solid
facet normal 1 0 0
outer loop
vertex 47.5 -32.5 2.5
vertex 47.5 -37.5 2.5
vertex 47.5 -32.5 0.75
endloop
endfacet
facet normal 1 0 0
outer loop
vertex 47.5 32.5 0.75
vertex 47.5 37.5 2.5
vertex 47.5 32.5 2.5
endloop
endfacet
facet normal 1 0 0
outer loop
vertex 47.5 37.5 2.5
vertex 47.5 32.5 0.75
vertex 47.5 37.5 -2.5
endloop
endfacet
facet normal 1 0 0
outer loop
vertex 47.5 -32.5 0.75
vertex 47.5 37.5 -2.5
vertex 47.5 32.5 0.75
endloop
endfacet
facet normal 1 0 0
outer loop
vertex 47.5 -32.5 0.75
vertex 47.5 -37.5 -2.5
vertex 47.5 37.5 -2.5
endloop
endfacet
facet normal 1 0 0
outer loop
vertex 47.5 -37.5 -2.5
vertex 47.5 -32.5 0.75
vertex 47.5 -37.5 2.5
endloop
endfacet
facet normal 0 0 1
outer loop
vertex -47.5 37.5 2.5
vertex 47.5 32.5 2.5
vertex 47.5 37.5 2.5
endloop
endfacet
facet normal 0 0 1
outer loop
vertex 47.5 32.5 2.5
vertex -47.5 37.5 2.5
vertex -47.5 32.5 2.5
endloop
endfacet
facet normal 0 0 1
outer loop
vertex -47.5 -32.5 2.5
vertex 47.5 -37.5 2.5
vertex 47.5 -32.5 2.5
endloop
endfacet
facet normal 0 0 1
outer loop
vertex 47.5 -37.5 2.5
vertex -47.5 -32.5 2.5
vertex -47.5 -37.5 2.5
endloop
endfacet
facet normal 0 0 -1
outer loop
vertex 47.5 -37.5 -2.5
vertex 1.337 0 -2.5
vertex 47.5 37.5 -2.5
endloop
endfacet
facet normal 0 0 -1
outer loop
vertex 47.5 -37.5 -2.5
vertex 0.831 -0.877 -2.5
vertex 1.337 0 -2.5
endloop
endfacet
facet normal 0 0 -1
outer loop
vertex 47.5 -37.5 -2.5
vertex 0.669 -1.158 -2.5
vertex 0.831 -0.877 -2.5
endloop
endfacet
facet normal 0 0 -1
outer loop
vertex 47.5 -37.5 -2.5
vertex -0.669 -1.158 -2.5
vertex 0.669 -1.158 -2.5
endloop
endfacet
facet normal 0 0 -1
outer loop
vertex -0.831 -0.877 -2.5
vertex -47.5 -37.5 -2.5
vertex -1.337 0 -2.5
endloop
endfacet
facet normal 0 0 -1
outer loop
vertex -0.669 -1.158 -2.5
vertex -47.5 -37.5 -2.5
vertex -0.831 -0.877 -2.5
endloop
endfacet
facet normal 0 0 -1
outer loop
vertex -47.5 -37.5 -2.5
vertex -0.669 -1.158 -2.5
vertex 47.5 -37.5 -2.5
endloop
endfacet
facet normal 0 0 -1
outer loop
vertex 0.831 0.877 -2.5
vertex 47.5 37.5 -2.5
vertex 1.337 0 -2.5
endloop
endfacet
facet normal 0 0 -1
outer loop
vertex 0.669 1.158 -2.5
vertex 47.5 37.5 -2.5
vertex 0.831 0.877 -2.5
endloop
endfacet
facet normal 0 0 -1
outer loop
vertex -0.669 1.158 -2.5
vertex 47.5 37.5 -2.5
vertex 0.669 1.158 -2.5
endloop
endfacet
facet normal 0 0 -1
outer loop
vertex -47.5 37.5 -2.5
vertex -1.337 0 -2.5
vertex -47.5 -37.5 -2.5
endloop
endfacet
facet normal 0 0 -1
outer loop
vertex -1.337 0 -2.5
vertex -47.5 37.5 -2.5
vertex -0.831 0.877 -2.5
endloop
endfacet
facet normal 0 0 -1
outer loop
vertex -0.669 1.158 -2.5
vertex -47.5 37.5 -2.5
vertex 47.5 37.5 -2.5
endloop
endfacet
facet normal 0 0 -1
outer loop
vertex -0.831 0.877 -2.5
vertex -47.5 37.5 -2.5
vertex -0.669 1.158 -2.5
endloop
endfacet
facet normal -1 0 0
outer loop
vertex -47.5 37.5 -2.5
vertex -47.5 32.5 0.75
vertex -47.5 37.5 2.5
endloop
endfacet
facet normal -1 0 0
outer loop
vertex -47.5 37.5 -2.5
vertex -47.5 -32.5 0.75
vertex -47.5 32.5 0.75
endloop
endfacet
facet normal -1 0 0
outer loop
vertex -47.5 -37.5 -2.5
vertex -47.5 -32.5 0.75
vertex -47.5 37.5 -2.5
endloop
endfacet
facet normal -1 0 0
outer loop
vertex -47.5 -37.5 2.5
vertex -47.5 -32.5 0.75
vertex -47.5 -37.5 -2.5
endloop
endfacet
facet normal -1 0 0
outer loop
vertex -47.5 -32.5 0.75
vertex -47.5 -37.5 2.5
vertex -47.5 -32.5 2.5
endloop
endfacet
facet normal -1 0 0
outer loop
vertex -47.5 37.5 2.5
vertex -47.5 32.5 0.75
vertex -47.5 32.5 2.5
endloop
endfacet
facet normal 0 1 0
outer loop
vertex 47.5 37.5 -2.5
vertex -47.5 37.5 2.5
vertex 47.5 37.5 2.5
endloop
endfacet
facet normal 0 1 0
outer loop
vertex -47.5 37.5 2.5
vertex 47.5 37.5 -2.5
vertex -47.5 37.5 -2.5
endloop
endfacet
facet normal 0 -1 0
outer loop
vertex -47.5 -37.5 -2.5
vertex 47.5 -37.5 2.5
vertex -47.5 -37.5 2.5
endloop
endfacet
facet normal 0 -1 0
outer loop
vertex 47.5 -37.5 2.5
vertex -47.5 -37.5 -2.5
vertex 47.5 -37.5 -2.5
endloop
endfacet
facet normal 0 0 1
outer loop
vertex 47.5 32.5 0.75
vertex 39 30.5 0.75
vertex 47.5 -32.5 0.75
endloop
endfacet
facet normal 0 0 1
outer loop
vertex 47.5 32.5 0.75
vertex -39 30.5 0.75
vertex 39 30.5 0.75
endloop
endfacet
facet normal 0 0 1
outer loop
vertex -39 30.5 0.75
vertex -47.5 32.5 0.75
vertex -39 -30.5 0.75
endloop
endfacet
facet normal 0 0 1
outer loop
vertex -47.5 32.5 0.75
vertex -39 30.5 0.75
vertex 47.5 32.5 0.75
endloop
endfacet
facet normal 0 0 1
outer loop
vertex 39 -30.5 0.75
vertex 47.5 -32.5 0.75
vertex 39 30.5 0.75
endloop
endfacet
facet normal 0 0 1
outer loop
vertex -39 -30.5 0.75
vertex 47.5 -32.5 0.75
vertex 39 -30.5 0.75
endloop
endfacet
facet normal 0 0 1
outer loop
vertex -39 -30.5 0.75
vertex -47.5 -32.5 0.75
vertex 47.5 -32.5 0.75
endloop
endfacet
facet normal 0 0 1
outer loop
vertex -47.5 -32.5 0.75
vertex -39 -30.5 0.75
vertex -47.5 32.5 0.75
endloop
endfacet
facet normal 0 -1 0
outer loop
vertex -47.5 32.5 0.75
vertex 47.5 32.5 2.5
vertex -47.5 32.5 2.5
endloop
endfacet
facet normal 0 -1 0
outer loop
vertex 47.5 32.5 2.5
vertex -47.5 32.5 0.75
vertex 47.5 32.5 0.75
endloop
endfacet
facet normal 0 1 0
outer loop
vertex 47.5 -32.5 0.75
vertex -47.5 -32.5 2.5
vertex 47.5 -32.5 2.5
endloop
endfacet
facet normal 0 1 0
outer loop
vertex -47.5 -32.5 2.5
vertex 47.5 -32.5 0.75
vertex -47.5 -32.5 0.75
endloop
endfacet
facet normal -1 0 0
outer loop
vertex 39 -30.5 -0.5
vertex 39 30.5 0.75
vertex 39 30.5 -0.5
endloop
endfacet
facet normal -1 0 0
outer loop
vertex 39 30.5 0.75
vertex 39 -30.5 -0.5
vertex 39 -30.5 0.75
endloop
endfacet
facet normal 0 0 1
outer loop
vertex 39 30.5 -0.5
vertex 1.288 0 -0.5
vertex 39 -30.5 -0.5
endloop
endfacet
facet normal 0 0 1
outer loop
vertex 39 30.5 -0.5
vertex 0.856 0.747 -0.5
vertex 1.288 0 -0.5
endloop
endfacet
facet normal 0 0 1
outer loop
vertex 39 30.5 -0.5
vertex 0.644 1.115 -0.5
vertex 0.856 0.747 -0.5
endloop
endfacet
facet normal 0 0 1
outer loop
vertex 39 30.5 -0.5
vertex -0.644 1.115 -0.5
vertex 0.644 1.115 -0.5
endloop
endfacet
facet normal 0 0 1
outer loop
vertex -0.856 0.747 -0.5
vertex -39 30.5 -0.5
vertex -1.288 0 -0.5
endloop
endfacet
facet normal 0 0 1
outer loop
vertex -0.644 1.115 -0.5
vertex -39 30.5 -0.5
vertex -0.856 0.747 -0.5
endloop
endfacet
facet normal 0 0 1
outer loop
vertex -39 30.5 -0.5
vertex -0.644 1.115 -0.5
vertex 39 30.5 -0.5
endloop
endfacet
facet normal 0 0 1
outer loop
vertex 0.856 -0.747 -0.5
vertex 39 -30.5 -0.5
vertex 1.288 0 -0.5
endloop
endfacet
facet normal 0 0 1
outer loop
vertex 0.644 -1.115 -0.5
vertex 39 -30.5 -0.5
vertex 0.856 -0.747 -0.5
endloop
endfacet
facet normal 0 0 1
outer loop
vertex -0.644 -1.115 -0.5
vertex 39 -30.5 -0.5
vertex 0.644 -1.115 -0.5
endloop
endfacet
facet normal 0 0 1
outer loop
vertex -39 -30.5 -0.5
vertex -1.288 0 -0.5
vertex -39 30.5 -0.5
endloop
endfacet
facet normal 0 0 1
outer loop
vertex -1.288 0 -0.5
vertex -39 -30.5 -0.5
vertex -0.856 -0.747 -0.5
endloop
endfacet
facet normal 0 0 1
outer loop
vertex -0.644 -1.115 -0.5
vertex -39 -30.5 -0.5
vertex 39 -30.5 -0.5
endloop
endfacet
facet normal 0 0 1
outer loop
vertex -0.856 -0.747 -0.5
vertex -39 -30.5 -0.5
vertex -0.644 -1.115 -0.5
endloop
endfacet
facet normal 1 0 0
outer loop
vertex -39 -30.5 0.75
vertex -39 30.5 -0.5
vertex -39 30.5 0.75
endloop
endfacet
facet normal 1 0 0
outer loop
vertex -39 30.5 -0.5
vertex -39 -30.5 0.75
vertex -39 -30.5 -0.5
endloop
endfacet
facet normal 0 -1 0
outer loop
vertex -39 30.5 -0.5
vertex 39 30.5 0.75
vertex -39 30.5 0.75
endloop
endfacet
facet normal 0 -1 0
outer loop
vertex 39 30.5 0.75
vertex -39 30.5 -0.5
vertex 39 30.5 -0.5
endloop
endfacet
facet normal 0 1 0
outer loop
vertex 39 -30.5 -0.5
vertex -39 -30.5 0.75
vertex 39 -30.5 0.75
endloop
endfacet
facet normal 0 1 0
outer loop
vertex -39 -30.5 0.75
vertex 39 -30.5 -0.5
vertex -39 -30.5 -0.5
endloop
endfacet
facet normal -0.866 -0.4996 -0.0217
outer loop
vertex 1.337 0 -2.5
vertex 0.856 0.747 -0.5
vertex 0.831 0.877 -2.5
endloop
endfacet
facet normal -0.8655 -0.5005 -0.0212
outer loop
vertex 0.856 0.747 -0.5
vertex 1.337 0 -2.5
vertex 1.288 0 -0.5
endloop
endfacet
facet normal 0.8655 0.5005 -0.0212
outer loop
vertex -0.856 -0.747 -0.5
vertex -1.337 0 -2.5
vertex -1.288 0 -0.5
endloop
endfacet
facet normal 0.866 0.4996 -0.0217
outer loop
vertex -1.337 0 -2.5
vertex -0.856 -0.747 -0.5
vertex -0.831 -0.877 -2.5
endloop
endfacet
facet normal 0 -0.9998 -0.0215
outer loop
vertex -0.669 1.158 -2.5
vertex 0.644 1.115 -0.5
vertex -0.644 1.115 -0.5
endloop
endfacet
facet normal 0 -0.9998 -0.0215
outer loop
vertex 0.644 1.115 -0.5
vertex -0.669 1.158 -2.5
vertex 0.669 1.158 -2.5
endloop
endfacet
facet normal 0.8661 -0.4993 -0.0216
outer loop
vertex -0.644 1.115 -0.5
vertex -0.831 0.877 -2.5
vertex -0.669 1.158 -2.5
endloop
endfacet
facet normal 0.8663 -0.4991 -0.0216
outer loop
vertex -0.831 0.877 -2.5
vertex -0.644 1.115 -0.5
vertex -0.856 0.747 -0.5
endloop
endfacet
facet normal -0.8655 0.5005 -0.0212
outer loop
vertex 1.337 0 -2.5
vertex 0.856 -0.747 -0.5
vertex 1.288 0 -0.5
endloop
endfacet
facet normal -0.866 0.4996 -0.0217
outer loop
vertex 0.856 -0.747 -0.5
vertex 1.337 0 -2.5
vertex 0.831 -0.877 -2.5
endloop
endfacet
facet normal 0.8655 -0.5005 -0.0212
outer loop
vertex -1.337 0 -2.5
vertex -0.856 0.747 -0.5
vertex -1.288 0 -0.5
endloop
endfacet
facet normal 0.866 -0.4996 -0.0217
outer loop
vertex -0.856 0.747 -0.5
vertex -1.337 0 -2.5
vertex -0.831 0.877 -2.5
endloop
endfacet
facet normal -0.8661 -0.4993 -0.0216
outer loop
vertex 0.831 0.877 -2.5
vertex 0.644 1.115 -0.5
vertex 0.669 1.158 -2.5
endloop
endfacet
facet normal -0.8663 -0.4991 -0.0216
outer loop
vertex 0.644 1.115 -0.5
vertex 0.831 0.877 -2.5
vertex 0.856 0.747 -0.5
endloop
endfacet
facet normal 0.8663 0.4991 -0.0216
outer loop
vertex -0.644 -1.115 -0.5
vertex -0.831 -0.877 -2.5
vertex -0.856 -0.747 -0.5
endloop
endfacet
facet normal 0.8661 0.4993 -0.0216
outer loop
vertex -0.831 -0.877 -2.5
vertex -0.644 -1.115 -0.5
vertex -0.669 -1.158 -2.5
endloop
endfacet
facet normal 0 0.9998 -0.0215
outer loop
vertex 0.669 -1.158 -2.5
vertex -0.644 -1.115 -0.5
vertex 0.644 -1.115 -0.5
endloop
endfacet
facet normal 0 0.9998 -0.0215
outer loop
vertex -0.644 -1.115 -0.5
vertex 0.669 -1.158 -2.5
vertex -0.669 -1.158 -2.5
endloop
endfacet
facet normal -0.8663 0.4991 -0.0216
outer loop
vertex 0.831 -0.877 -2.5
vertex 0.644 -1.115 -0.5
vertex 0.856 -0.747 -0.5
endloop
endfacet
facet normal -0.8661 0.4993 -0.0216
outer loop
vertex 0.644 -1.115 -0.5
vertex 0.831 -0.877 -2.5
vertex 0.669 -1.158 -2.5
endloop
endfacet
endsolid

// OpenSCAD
// Card
width=95;
depth=65;
height=1.65;
//translate([0,0,1.65])cube([width,depth,height],center=true);



//Bottom box
boxwidth=95;
boxdepth=75;
boxheight=5;
difference(){
cube([boxwidth,boxdepth,boxheight],center=true);
translate([0,0,boxheight/2-1.75/2])cube([95+0.1,65,1.75],center=true);

translate([0,0,boxheight/2-3/2])cube([78,61,3],center=true);
//translate([0,0,boxheight/2-3/2])cylinder(20,1.5,center=true);
translate([0,0,boxheight/2-3/2])cylinder(20,1.5,center=true,$fn=6);
}
